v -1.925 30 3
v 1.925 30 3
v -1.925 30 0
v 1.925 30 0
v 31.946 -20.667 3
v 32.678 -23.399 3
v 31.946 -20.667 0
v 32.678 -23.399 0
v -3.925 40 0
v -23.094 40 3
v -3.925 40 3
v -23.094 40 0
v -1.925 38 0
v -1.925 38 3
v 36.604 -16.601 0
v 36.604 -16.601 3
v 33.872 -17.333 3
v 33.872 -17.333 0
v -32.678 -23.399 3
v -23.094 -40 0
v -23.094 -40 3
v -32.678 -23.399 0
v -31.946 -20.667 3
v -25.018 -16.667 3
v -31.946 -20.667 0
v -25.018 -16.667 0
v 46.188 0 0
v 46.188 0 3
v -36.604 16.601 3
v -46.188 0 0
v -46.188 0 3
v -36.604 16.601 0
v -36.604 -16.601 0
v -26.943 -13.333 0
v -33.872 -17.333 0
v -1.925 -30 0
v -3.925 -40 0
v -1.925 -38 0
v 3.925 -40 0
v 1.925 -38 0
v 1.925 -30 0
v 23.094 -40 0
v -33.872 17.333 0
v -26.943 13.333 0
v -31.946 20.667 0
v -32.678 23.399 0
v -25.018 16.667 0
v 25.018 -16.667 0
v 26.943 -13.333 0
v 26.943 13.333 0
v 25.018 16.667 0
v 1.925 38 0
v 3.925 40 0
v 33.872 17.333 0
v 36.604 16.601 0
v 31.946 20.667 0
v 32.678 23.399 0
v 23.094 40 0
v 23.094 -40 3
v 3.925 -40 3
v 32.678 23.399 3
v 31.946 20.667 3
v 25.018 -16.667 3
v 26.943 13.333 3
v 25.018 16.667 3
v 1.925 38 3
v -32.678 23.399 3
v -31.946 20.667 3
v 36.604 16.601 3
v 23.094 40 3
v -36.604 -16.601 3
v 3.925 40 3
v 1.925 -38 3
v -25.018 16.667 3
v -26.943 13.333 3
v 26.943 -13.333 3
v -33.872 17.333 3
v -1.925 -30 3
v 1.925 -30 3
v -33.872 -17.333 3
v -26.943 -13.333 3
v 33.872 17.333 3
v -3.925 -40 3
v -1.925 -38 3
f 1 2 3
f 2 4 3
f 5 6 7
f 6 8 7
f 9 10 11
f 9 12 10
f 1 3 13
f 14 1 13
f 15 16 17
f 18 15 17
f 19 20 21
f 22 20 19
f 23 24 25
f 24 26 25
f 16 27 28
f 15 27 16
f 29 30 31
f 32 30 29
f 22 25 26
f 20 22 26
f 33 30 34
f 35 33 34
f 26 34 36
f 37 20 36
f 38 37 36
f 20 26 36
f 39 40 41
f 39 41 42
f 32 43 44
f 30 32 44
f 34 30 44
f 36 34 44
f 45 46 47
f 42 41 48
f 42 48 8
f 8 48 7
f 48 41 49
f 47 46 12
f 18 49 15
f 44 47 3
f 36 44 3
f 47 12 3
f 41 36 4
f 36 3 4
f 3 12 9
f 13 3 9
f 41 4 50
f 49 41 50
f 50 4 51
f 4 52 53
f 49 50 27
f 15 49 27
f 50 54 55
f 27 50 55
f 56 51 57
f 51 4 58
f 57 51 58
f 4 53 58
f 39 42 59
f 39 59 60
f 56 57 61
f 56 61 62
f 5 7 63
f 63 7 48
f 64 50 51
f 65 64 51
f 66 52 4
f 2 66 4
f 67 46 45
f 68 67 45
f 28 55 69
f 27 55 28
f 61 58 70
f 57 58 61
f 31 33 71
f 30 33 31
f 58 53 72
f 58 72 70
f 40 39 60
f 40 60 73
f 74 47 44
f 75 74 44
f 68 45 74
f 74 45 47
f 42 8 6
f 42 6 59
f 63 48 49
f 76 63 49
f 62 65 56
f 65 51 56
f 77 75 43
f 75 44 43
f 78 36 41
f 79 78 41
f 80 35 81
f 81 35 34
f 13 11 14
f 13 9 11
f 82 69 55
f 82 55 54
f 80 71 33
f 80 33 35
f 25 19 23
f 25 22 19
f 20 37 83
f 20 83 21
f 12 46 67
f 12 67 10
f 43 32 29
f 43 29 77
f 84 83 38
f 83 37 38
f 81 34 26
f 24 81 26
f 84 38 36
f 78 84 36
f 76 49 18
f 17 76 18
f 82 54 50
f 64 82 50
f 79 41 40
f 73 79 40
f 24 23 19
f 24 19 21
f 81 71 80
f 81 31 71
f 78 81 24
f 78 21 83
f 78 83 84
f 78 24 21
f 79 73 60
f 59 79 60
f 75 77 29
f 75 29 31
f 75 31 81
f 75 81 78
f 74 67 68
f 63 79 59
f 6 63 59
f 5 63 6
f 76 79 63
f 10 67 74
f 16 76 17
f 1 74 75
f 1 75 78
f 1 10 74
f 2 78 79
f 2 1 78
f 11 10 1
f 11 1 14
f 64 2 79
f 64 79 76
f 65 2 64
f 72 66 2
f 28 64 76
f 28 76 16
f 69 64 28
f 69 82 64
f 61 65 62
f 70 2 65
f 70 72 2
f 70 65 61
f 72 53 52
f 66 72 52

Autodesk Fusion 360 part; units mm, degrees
sketch "Sketch1" plane through (0, 0, 0) normal (0, 0, 1) x (1, 0, 0) in component "Component"
  line L0 (-4.9635, 8.6391) -> (5.0365, 8.6391)
  line L1 (-9.9634, 0.021) -> (-4.9634, 8.6813)
  line L2 (-4.9999, -8.6181) -> (-9.9999, 0.0422)
  line L3 (4.9635, -8.6391) -> (-5.0365, -8.6391)
  line L4 (9.9634, -0.021) -> (4.9634, -8.6813)
  line L5 (4.9999, 8.6181) -> (9.9999, -0.0422)
  dimension "d2" = 10
  dimension "d4" = 360
  dimension "d5" = 10
  dimension "d6" = 10
sketch "Sketch2" plane through (0, 0, 0) normal (0, 0, 1) x (1, 0, 0) in component "Component"
  line L0 (23.094, 40) -> (0, 0) construction
  line L1 (0, 0) -> (-23.094, 40) construction
  line L2 (1.925, 38) -> (1.925, 30)
  line L3 (1.925, 30) -> (-1.925, 30)
  line L4 (-1.925, 30) -> (-1.925, 38)
  line L5 (-23.094, 40) -> (-3.925, 40)
  line L6 (3.925, 40) -> (23.094, 40)
  line L7 (-3.925, 40) -> (-1.925, 38)
  line L8 (0, 30) -> (0, 40) construction
  line L9 (3.925, 40) -> (1.925, 38)
  line L10 (-32.6785, 23.3991) -> (-23.094, 40)
  line L11 (-32.6785, 23.3991) -> (-31.9465, 20.6671)
  line L12 (-26.9433, 13.3329) -> (-33.8715, 17.3329)
  line L13 (-25.9808, 15) -> (-34.641, 20) construction
  line L14 (-36.6035, 16.6009) -> (-33.8715, 17.3329)
  line L15 (-46.188, 0) -> (-36.6035, 16.6009)
  line L16 (-25.0183, 16.6671) -> (-26.9433, 13.3329)
  line L17 (-31.9465, 20.6671) -> (-25.0183, 16.6671)
  line L18 (-36.6035, -16.6009) -> (-46.188, 0)
  line L19 (-36.6035, -16.6009) -> (-33.8715, -17.3329)
  line L20 (-25.0183, -16.6671) -> (-31.9465, -20.6671)
  line L21 (-25.9808, -15) -> (-34.641, -20) construction
  line L22 (-32.6785, -23.3991) -> (-31.9465, -20.6671)
  line L23 (-23.094, -40) -> (-32.6785, -23.3991)
  line L24 (-26.9433, -13.3329) -> (-25.0183, -16.6671)
  line L25 (-33.8715, -17.3329) -> (-26.9433, -13.3329)
  line L26 (-3.925, -40) -> (-23.094, -40)
  line L27 (-3.925, -40) -> (-1.925, -38)
  line L28 (1.925, -30) -> (1.925, -38)
  line L29 (0, -30) -> (0, -40) construction
  line L30 (3.925, -40) -> (1.925, -38)
  line L31 (23.094, -40) -> (3.925, -40)
  line L32 (-1.925, -30) -> (1.925, -30)
  line L33 (-1.925, -38) -> (-1.925, -30)
  line L34 (32.6785, -23.3991) -> (23.094, -40)
  line L35 (32.6785, -23.3991) -> (31.9465, -20.6671)
  line L36 (26.9433, -13.3329) -> (33.8715, -17.3329)
  line L37 (25.9808, -15) -> (34.641, -20) construction
  line L38 (36.6035, -16.6009) -> (33.8715, -17.3329)
  line L39 (46.188, 0) -> (36.6035, -16.6009)
  line L40 (25.0183, -16.6671) -> (26.9433, -13.3329)
  line L41 (31.9465, -20.6671) -> (25.0183, -16.6671)
  line L42 (36.6035, 16.6009) -> (46.188, 0)
  line L43 (36.6035, 16.6009) -> (33.8715, 17.3329)
  line L44 (25.0183, 16.6671) -> (31.9465, 20.6671)
  line L45 (25.9808, 15) -> (34.641, 20) construction
  line L46 (32.6785, 23.3991) -> (31.9465, 20.6671)
  line L47 (23.094, 40) -> (32.6785, 23.3991)
  line L48 (26.9433, 13.3329) -> (25.0183, 16.6671)
  line L49 (33.8715, 17.3329) -> (26.9433, 13.3329)
  point P0 (0, 40)
  point P1 (0, 40)
  point P2 (-34.641, 20)
  point P3 (-34.641, 20)
  point P4 (-34.641, -20)
  point P5 (-34.641, -20)
  point P6 (0, -40)
  point P7 (0, -40)
  point P8 (34.641, -20)
  point P9 (34.641, -20)
  point P10 (34.641, 20)
  point P11 (34.641, 20)
  dimension "d8" = 40
  dimension "d10" = 60
  dimension "d22" = 45
  dimension "d23" = 2
  dimension "d24" = 3.85
  dimension "d25" = 10
  dimension "d27" = 360
extrude "Extrude1" add sketch "Sketch2" along normal blind 3
component "Component" placed x (1, 0, 0) y (0, 1, 0) z (0, 0, 1) at (0, 0, 0)
equation "Radius = 40 mm"
equation "d8 = Radius"
equation "NumberSides = 6"
equation "d10 = Angle"
equation "Angle = ( 360 / NumberSides ) * 1 deg"
equation "Thickness = 4 mm"
equation "Kerf = 0.15 mm"
equation "Slot = 10 mm"
equation "Chamfer_Angle = 45 deg"
equation "Chamfer_Size = 2 mm"
equation "d22 = Chamfer_Angle"
equation "d23 = Chamfer_Size"
equation "d24 = Thickness - Kerf"
equation "d25 = Slot"
equation "d26 = NumberSides"
